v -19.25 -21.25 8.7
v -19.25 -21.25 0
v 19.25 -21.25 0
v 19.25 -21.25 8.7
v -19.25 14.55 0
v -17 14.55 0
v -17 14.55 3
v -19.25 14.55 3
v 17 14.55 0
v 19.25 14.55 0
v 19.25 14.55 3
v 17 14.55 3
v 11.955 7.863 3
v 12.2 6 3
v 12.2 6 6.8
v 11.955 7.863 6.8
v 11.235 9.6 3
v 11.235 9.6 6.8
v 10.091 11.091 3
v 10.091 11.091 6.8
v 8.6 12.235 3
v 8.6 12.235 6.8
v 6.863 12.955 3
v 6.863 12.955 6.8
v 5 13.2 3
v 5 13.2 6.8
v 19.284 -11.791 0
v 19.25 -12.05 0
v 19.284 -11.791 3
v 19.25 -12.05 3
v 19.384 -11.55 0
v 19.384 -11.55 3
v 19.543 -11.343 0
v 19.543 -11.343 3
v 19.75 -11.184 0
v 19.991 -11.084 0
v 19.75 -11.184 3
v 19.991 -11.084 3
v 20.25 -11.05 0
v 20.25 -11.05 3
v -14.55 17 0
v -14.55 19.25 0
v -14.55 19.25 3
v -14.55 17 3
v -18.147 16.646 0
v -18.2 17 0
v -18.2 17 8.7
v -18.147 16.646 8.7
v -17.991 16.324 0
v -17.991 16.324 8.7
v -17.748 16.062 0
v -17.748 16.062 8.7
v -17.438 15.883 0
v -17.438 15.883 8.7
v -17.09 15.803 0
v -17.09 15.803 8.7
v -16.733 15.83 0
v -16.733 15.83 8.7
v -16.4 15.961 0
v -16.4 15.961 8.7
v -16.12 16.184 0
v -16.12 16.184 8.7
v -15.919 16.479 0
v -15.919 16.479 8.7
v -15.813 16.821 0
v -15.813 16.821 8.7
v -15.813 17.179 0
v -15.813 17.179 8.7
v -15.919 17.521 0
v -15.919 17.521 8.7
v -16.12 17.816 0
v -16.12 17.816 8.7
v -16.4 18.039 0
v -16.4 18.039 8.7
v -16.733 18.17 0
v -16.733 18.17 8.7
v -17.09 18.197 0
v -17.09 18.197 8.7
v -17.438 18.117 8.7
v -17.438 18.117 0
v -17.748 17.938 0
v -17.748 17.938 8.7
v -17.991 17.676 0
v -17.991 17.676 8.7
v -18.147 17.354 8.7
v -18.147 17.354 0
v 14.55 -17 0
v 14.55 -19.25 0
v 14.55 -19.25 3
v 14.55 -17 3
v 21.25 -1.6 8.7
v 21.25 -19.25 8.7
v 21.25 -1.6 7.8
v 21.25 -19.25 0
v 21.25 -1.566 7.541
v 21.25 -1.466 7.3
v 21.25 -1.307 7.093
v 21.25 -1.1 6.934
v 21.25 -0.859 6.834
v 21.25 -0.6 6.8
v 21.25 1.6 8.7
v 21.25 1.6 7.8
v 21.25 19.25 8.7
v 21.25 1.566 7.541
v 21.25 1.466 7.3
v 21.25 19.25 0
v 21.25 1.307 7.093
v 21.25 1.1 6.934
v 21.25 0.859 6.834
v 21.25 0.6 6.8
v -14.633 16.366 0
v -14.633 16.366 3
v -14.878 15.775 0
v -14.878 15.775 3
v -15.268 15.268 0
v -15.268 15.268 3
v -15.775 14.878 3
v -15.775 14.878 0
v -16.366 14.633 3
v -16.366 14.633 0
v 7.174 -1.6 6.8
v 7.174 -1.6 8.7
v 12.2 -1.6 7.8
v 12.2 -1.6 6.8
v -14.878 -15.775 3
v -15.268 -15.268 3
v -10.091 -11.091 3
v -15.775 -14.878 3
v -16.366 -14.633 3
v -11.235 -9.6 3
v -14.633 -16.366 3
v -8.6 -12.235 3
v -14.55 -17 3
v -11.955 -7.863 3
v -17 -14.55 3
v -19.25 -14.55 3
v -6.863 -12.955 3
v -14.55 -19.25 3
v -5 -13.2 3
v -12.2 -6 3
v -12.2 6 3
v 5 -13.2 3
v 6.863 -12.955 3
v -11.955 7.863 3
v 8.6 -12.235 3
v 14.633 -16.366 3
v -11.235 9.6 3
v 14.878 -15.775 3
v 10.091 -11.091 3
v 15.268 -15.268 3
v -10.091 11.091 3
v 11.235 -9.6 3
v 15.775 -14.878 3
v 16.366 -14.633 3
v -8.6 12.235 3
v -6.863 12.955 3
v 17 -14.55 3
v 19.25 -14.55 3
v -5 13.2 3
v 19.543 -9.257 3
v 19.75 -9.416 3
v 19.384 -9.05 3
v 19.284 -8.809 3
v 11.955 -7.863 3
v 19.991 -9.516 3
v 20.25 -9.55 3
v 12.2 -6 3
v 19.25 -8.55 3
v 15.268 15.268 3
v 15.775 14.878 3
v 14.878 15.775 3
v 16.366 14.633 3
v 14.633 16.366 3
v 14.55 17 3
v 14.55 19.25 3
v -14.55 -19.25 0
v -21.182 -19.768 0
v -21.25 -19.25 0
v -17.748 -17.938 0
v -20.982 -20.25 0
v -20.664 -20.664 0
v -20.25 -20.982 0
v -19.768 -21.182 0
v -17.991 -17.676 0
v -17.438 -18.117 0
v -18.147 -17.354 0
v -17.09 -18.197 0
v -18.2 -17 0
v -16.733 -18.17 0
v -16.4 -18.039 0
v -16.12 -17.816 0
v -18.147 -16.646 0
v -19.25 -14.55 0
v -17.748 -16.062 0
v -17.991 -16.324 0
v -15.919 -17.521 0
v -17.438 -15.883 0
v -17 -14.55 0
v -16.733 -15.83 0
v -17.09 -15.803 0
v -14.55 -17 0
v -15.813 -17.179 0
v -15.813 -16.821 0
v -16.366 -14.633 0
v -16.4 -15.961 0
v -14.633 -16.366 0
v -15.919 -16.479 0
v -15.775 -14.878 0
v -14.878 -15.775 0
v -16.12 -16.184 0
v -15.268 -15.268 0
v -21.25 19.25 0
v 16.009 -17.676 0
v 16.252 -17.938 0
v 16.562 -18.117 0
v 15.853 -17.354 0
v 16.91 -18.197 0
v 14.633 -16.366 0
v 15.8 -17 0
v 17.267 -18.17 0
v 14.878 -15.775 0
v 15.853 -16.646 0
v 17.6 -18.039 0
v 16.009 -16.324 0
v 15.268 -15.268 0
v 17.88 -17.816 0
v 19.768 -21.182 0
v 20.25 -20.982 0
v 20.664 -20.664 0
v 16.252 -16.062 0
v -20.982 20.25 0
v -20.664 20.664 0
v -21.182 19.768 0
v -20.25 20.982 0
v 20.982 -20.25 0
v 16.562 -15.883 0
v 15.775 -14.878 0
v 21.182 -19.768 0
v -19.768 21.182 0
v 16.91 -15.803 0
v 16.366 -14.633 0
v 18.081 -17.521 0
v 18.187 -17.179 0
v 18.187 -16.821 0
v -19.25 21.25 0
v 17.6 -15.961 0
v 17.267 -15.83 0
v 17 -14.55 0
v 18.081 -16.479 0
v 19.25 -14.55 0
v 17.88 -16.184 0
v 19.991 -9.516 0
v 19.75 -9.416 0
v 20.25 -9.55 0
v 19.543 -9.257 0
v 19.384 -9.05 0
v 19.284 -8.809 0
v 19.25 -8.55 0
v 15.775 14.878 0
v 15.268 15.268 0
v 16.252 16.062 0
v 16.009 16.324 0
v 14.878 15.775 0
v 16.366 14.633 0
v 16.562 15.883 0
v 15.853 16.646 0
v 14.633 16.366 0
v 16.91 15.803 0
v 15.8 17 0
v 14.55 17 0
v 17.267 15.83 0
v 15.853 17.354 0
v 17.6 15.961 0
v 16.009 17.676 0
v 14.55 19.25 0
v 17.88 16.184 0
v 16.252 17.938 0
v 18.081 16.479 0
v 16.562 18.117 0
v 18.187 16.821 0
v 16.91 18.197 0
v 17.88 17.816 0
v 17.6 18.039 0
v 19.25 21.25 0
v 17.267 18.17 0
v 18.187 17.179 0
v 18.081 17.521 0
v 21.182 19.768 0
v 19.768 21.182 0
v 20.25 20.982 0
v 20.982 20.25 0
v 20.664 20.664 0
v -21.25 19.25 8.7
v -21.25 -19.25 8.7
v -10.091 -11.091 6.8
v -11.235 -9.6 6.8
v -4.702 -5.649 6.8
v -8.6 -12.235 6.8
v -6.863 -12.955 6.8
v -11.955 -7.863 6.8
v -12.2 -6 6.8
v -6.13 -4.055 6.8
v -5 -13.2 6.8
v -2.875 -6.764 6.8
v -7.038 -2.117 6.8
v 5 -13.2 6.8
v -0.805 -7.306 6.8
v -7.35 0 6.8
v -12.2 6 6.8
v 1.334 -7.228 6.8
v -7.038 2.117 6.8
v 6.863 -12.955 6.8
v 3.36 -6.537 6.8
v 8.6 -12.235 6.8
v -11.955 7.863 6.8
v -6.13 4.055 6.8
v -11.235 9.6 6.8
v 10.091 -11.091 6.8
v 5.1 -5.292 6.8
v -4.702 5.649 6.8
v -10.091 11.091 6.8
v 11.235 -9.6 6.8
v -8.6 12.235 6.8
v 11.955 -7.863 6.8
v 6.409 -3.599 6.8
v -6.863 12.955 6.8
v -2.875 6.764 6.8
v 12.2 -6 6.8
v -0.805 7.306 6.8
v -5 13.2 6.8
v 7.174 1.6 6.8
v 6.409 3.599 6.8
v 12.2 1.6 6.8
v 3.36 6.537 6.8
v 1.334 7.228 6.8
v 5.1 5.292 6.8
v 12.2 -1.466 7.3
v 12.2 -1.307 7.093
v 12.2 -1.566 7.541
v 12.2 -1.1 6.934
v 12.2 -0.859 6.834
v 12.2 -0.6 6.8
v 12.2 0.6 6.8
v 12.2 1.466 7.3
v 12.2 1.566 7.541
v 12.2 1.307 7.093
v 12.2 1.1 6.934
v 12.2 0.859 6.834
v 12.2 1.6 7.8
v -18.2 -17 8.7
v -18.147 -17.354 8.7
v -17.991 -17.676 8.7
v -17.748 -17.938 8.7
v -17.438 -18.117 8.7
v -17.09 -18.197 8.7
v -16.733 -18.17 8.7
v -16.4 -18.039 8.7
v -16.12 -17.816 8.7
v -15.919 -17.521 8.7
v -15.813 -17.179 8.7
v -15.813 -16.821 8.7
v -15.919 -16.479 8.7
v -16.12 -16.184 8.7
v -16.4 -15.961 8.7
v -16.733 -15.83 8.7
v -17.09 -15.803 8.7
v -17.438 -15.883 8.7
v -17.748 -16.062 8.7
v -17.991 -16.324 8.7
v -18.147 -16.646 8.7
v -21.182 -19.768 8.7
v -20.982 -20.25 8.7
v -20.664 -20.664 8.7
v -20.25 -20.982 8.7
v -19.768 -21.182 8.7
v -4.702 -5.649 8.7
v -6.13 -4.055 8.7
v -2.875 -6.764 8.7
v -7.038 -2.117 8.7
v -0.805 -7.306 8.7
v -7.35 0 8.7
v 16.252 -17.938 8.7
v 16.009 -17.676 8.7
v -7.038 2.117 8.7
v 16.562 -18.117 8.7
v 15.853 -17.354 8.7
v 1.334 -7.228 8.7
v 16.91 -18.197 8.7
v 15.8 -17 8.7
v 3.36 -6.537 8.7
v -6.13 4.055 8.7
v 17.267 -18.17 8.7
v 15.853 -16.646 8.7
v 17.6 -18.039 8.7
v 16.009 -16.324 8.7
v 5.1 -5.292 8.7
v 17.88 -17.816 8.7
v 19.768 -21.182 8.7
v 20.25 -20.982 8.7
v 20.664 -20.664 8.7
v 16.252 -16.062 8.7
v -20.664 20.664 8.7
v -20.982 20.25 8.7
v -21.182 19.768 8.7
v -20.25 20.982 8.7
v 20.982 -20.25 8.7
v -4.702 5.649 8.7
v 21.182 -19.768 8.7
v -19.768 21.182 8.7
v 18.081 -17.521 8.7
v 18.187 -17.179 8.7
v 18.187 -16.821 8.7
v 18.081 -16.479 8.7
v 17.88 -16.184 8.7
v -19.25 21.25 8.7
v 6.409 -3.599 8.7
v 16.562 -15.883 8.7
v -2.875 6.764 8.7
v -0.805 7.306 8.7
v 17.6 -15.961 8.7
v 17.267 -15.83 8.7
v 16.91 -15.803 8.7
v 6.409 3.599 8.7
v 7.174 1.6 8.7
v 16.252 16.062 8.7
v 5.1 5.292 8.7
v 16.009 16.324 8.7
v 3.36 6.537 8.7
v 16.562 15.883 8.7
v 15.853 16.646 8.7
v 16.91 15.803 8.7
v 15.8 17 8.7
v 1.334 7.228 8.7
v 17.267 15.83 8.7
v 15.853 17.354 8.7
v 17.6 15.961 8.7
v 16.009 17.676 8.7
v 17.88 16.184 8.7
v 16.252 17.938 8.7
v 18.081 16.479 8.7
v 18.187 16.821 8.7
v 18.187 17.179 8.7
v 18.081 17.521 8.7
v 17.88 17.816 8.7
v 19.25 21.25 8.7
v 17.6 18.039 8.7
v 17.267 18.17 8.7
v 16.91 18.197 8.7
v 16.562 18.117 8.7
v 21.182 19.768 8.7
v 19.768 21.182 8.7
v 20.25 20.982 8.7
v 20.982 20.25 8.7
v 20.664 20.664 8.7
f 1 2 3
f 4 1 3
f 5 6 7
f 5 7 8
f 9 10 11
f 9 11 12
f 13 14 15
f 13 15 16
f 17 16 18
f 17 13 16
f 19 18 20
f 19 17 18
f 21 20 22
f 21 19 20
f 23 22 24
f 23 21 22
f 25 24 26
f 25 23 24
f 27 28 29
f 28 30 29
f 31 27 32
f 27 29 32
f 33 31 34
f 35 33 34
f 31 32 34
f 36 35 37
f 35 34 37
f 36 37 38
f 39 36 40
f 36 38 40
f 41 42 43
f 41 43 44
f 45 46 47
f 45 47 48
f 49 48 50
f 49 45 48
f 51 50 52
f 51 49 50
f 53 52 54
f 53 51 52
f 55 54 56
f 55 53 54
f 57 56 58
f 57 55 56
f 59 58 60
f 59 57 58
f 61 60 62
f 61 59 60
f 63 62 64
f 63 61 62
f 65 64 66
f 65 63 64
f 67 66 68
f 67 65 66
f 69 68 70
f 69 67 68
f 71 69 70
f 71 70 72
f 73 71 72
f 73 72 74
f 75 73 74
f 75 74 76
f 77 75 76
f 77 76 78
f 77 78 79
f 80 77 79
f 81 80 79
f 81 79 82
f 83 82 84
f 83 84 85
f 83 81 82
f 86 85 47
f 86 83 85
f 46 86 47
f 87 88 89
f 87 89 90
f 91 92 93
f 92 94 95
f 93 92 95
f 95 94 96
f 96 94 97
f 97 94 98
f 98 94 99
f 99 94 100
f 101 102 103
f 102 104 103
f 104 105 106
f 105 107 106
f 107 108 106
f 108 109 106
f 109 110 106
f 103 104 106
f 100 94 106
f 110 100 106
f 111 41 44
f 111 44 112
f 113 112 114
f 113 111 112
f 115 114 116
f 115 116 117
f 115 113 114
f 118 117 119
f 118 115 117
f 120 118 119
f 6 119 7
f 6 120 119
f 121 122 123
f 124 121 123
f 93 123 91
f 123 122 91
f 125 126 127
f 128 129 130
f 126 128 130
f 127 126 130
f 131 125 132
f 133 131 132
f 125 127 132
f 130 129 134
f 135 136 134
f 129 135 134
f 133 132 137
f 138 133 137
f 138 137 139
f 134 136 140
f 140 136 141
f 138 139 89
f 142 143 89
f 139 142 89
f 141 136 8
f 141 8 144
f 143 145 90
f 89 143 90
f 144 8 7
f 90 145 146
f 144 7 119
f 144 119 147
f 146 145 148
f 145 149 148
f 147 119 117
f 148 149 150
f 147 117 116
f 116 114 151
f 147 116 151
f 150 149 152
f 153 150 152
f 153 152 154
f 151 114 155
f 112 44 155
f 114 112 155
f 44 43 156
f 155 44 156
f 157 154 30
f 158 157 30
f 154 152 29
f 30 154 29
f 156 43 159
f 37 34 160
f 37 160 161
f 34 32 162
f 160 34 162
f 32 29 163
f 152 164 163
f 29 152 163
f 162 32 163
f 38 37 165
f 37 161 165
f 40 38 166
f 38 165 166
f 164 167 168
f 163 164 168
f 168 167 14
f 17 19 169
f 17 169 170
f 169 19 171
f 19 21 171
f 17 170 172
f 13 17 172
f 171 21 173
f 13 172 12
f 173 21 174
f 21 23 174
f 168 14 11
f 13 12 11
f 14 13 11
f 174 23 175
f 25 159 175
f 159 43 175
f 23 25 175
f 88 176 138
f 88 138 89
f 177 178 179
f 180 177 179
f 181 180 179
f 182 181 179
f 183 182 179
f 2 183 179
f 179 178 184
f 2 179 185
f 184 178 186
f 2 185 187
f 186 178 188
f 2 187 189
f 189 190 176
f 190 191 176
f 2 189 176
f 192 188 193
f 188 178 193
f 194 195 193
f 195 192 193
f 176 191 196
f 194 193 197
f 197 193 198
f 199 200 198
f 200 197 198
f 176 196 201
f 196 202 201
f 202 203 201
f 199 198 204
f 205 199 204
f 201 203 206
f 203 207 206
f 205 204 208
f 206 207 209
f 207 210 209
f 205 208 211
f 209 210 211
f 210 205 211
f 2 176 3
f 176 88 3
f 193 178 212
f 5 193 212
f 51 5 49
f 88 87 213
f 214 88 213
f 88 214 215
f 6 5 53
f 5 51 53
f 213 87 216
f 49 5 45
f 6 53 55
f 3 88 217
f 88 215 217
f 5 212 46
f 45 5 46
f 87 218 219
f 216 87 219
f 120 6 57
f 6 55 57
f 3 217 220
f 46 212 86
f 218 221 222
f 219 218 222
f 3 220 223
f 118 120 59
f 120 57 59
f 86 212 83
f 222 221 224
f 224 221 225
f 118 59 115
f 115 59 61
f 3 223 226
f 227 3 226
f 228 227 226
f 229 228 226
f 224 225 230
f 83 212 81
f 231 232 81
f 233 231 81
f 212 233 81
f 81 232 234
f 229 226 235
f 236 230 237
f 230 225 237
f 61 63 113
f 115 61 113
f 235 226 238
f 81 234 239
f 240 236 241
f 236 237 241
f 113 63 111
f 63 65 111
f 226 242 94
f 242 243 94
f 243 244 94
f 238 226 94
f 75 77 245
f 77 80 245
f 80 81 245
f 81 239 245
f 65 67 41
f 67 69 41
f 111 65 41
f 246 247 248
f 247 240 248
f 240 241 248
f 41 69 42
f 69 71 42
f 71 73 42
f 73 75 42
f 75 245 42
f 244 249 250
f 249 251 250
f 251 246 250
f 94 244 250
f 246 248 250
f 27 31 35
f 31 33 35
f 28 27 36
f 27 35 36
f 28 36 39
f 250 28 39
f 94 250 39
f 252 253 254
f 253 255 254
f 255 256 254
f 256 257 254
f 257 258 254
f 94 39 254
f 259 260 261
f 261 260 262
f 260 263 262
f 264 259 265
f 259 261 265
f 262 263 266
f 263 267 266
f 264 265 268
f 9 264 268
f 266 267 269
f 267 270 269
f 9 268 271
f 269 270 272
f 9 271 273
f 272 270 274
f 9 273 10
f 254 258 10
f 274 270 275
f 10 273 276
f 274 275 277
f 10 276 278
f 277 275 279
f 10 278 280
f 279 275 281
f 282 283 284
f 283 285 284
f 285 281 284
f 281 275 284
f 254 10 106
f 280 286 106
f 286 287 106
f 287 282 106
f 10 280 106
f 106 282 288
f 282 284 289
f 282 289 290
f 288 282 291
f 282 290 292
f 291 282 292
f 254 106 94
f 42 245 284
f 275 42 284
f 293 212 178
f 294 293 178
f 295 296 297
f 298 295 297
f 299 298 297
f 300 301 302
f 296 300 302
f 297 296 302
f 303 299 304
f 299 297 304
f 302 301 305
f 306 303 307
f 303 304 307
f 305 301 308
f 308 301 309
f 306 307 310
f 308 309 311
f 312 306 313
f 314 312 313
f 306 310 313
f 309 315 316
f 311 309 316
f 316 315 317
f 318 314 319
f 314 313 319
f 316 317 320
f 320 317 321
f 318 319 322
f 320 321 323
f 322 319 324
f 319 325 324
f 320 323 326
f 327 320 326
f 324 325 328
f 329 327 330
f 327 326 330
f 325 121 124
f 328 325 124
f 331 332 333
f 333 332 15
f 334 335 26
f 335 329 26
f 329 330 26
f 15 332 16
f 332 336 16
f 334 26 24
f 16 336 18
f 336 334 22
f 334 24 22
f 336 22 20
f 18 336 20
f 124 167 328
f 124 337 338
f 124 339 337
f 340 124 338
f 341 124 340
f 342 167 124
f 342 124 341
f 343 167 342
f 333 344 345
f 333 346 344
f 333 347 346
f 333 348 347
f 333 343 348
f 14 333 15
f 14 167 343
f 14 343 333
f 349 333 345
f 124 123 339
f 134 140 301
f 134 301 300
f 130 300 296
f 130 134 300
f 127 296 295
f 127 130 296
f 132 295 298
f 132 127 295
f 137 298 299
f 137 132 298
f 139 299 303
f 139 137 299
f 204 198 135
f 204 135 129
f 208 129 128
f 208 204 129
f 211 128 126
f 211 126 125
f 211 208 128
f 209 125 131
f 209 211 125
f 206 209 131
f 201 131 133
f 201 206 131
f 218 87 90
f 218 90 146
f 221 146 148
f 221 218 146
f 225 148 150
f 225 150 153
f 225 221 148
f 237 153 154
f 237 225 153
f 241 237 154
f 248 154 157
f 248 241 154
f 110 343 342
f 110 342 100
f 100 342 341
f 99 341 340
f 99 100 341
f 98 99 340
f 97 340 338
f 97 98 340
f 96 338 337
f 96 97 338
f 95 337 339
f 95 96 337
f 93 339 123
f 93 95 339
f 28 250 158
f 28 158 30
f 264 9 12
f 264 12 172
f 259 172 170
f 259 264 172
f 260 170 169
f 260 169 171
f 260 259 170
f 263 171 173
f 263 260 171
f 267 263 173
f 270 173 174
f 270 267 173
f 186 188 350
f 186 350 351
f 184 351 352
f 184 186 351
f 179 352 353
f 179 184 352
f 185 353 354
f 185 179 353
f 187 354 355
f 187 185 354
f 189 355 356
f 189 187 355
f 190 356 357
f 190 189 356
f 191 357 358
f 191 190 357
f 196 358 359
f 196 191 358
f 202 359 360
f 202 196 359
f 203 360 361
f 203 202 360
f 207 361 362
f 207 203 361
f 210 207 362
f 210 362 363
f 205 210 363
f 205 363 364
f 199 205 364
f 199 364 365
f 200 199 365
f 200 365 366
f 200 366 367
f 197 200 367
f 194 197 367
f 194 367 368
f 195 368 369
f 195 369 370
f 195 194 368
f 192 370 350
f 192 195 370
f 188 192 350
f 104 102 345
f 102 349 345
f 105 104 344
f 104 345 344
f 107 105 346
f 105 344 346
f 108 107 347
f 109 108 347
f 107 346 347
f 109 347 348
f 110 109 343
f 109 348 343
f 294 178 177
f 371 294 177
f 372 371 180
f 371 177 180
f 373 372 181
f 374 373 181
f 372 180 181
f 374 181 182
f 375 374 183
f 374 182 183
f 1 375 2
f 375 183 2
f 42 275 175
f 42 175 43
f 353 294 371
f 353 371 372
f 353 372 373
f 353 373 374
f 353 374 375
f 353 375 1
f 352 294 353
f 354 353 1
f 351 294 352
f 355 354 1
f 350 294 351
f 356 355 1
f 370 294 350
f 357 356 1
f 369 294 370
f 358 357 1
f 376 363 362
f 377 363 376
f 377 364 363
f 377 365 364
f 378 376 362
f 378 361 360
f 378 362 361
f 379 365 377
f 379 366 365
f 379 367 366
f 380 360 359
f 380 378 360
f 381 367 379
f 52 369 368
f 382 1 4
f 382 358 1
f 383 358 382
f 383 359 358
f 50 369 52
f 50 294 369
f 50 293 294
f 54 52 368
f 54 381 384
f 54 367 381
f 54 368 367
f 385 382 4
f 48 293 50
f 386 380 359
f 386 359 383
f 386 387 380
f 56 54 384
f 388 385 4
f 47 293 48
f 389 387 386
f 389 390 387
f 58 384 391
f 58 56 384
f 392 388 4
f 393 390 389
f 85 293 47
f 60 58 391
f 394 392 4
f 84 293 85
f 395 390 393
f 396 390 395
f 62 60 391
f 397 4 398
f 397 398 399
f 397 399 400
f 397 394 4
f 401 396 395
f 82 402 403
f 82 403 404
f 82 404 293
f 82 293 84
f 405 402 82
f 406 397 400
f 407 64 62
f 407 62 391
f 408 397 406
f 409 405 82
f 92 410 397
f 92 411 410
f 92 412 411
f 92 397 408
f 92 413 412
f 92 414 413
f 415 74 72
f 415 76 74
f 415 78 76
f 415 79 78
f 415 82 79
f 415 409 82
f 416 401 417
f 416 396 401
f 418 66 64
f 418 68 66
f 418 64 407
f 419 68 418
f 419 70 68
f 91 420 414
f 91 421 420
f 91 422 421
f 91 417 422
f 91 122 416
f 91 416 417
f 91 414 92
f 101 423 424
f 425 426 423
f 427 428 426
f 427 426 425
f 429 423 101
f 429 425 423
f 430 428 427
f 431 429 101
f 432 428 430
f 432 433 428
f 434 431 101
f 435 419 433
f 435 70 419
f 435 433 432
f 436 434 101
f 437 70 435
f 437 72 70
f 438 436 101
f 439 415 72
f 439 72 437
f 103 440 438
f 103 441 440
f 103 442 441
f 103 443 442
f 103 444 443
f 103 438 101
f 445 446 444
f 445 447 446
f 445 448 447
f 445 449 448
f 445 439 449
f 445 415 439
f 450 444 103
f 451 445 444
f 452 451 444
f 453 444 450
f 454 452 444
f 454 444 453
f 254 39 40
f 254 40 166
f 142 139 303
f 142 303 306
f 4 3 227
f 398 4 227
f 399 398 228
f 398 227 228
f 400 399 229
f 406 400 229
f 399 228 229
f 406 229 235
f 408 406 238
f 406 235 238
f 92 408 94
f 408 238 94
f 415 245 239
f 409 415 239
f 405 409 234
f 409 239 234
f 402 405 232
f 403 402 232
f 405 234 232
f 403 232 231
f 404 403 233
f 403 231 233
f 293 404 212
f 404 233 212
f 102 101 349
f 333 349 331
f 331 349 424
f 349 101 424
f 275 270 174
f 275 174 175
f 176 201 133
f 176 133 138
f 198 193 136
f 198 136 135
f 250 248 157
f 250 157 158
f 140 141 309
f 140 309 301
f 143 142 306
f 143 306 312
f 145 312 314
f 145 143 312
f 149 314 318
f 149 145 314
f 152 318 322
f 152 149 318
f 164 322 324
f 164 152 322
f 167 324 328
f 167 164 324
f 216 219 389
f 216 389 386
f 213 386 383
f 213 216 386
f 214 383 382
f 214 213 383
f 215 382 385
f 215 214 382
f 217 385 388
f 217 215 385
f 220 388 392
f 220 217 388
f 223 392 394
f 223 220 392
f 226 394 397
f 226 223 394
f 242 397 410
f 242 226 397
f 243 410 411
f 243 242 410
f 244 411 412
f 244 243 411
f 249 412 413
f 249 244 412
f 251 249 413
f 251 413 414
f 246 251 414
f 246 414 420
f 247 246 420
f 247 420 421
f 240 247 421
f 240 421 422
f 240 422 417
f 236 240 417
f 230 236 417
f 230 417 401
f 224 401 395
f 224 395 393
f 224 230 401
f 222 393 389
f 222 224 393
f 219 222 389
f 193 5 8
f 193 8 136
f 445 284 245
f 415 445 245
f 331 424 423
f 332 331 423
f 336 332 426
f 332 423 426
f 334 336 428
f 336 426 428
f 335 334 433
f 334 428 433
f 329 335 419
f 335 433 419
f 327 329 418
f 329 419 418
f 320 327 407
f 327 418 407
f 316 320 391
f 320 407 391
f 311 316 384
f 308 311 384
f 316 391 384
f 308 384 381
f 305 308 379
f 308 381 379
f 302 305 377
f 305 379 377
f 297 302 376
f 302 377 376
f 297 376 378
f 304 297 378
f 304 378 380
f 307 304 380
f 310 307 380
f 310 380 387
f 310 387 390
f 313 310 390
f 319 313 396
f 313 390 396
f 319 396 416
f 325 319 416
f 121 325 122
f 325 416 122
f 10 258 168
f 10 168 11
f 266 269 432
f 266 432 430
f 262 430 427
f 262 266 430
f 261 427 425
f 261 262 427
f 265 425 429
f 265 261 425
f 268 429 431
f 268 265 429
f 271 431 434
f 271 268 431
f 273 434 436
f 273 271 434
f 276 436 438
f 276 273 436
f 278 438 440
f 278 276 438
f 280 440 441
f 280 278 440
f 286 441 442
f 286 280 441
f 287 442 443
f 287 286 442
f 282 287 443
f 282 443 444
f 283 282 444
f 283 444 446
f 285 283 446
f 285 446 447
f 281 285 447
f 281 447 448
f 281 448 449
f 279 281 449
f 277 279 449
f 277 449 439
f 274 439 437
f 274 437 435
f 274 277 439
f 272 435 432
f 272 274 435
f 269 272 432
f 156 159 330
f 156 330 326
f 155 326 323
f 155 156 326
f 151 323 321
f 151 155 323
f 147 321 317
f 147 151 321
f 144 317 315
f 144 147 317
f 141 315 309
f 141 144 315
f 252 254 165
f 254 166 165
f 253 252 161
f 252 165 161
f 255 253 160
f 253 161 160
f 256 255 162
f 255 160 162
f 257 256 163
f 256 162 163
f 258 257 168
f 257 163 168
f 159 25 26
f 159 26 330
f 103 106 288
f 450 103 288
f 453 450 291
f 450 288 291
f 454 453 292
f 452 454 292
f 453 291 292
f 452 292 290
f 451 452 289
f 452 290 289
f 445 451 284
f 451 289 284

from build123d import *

# Parameters (mm, degrees)
SKETCH1_R           = 1.2
BOSS_EXTRUDE1_DEPTH = 8.7
CUT_EXTRUDE2_DEPTH  = 3
CUT_EXTRUDE3_DEPTH  = 3.8
CUT_EXTRUDE4_DEPTH  = 1.9
SKETCH5_W           = 1
SKETCH5_H           = 1.5
CUT_EXTRUDE5_DEPTH  = 3
FILLET1_R           = 1


with BuildPart() as part:
    # Sketch1 → Boss-Extrude1 (new body)
    with BuildSketch(Plane.XY):
        with BuildLine():
            Line((21.25, -19.25), (21.25, 19.25))
            ThreePointArc((21.25, 19.25), (20.664213562, 20.664213562), (19.25, 21.25))
            Line((19.25, 21.25), (-19.25, 21.25))
            ThreePointArc((-19.25, 21.25), (-20.664213562, 20.664213562), (-21.25, 19.25))
            Line((-21.25, 19.25), (-21.25, -19.25))
            ThreePointArc((-21.25, -19.25), (-20.664213562, -20.664213562), (-19.25, -21.25))
            Line((-19.25, -21.25), (19.25, -21.25))
            ThreePointArc((19.25, -21.25), (20.664213562, -20.664213562), (21.25, -19.25))
        make_face()
        with Locations(Location((-17, -17, 0), (0, 0, 180))):
            Circle(SKETCH1_R, mode=Mode.SUBTRACT)
        with Locations(Location((17, -17, 0), (0, 0, 180))):
            Circle(SKETCH1_R, mode=Mode.SUBTRACT)
        with Locations(Location((17, 17, 0), (0, 0, 180))):
            Circle(SKETCH1_R, mode=Mode.SUBTRACT)
        with Locations(Location((-17, 17, 0), (0, 0, 180))):
            Circle(SKETCH1_R, mode=Mode.SUBTRACT)
    extrude(amount=BOSS_EXTRUDE1_DEPTH)

    # Sketch2 → Cut-Extrude2 (cut)
    with BuildSketch(Plane(origin=(0, 0, 0), x_dir=(-1, 0, 0), z_dir=(0, 0, -1))):
        with BuildLine():
            Line((14.55, -19.25), (-14.55, -19.25))
            Line((-14.55, -19.25), (-14.55, -17))
            ThreePointArc((-14.55, -17), (-15.267588386, -15.267588386), (-17, -14.55))
            Line((-17, -14.55), (-19.25, -14.55))
            Line((-19.25, -14.55), (-19.25, 14.55))
            Line((-19.25, 14.55), (-17, 14.55))
            ThreePointArc((-17, 14.55), (-15.267588386, 15.267588386), (-14.55, 17))
            Line((-14.55, 17), (-14.55, 19.25))
            Line((-14.55, 19.25), (14.55, 19.25))
            Line((14.55, 19.25), (14.55, 17))
            ThreePointArc((14.55, 17), (15.267588386, 15.267588386), (17, 14.55))
            Line((17, 14.55), (19.25, 14.55))
            Line((19.25, 14.55), (19.25, -14.55))
            Line((19.25, -14.55), (17, -14.55))
            ThreePointArc((17, -14.55), (15.267588386, -15.267588386), (14.55, -17))
            Line((14.55, -17), (14.55, -19.25))
        make_face()
    extrude(amount=-CUT_EXTRUDE2_DEPTH, mode=Mode.SUBTRACT)

    # Sketch3 → Cut-Extrude3 (cut)
    with BuildSketch(Plane(origin=(0, 0, 3), x_dir=(-1, 0, 0), z_dir=(0, 0, -1))):
        with BuildLine():
            Line((-12.2, -6), (-12.2, 6))
            ThreePointArc((-12.2, 6), (-10.091168825, 11.091168825), (-5, 13.2))
            Line((-5, 13.2), (5, 13.2))
            ThreePointArc((5, 13.2), (10.091168825, 11.091168825), (12.2, 6))
            Line((12.2, 6), (12.2, -6))
            ThreePointArc((12.2, -6), (10.091168825, -11.091168825), (5, -13.2))
            Line((5, -13.2), (-5, -13.2))
            ThreePointArc((-5, -13.2), (-10.091168825, -11.091168825), (-12.2, -6))
        make_face()
    extrude(amount=-CUT_EXTRUDE3_DEPTH, mode=Mode.SUBTRACT)

    # Sketch4 → Cut-Extrude4 (cut)
    with BuildSketch(Plane.XY.offset(8.7)):
        with BuildLine():
            Line((21.25, 1.6), (7.173736823, 1.6))
            ThreePointArc((7.173736823, 1.6), (-7.35, 0), (7.173736823, -1.6))
            Line((7.173736823, -1.6), (21.25, -1.6))
            Line((21.25, -1.6), (21.25, 1.6))
        make_face()
    extrude(amount=-CUT_EXTRUDE4_DEPTH, mode=Mode.SUBTRACT)

    # Sketch5 → Cut-Extrude5 (cut)
    with BuildSketch(Plane(origin=(0, 0, 0), x_dir=(-1, 0, 0), z_dir=(0, 0, -1))):
        with Locations((-19.75, -10.3)):
            Rectangle(SKETCH5_W, SKETCH5_H)
    extrude(amount=-CUT_EXTRUDE5_DEPTH, mode=Mode.SUBTRACT)

    # Fillet1
    fillet1_edges = [part.edges().sort_by_distance(p)[0] for p in [
        (19.25, -11.05, 1.5),
        (19.25, -9.55, 1.5),
        (16.725, -1.6, 6.8),
        (16.725, 1.6, 6.8),
    ]]
    fillet(fillet1_edges, radius=FILLET1_R - 0.0001)  # a hair under: the kernel refuses the full size


solid = part.part
